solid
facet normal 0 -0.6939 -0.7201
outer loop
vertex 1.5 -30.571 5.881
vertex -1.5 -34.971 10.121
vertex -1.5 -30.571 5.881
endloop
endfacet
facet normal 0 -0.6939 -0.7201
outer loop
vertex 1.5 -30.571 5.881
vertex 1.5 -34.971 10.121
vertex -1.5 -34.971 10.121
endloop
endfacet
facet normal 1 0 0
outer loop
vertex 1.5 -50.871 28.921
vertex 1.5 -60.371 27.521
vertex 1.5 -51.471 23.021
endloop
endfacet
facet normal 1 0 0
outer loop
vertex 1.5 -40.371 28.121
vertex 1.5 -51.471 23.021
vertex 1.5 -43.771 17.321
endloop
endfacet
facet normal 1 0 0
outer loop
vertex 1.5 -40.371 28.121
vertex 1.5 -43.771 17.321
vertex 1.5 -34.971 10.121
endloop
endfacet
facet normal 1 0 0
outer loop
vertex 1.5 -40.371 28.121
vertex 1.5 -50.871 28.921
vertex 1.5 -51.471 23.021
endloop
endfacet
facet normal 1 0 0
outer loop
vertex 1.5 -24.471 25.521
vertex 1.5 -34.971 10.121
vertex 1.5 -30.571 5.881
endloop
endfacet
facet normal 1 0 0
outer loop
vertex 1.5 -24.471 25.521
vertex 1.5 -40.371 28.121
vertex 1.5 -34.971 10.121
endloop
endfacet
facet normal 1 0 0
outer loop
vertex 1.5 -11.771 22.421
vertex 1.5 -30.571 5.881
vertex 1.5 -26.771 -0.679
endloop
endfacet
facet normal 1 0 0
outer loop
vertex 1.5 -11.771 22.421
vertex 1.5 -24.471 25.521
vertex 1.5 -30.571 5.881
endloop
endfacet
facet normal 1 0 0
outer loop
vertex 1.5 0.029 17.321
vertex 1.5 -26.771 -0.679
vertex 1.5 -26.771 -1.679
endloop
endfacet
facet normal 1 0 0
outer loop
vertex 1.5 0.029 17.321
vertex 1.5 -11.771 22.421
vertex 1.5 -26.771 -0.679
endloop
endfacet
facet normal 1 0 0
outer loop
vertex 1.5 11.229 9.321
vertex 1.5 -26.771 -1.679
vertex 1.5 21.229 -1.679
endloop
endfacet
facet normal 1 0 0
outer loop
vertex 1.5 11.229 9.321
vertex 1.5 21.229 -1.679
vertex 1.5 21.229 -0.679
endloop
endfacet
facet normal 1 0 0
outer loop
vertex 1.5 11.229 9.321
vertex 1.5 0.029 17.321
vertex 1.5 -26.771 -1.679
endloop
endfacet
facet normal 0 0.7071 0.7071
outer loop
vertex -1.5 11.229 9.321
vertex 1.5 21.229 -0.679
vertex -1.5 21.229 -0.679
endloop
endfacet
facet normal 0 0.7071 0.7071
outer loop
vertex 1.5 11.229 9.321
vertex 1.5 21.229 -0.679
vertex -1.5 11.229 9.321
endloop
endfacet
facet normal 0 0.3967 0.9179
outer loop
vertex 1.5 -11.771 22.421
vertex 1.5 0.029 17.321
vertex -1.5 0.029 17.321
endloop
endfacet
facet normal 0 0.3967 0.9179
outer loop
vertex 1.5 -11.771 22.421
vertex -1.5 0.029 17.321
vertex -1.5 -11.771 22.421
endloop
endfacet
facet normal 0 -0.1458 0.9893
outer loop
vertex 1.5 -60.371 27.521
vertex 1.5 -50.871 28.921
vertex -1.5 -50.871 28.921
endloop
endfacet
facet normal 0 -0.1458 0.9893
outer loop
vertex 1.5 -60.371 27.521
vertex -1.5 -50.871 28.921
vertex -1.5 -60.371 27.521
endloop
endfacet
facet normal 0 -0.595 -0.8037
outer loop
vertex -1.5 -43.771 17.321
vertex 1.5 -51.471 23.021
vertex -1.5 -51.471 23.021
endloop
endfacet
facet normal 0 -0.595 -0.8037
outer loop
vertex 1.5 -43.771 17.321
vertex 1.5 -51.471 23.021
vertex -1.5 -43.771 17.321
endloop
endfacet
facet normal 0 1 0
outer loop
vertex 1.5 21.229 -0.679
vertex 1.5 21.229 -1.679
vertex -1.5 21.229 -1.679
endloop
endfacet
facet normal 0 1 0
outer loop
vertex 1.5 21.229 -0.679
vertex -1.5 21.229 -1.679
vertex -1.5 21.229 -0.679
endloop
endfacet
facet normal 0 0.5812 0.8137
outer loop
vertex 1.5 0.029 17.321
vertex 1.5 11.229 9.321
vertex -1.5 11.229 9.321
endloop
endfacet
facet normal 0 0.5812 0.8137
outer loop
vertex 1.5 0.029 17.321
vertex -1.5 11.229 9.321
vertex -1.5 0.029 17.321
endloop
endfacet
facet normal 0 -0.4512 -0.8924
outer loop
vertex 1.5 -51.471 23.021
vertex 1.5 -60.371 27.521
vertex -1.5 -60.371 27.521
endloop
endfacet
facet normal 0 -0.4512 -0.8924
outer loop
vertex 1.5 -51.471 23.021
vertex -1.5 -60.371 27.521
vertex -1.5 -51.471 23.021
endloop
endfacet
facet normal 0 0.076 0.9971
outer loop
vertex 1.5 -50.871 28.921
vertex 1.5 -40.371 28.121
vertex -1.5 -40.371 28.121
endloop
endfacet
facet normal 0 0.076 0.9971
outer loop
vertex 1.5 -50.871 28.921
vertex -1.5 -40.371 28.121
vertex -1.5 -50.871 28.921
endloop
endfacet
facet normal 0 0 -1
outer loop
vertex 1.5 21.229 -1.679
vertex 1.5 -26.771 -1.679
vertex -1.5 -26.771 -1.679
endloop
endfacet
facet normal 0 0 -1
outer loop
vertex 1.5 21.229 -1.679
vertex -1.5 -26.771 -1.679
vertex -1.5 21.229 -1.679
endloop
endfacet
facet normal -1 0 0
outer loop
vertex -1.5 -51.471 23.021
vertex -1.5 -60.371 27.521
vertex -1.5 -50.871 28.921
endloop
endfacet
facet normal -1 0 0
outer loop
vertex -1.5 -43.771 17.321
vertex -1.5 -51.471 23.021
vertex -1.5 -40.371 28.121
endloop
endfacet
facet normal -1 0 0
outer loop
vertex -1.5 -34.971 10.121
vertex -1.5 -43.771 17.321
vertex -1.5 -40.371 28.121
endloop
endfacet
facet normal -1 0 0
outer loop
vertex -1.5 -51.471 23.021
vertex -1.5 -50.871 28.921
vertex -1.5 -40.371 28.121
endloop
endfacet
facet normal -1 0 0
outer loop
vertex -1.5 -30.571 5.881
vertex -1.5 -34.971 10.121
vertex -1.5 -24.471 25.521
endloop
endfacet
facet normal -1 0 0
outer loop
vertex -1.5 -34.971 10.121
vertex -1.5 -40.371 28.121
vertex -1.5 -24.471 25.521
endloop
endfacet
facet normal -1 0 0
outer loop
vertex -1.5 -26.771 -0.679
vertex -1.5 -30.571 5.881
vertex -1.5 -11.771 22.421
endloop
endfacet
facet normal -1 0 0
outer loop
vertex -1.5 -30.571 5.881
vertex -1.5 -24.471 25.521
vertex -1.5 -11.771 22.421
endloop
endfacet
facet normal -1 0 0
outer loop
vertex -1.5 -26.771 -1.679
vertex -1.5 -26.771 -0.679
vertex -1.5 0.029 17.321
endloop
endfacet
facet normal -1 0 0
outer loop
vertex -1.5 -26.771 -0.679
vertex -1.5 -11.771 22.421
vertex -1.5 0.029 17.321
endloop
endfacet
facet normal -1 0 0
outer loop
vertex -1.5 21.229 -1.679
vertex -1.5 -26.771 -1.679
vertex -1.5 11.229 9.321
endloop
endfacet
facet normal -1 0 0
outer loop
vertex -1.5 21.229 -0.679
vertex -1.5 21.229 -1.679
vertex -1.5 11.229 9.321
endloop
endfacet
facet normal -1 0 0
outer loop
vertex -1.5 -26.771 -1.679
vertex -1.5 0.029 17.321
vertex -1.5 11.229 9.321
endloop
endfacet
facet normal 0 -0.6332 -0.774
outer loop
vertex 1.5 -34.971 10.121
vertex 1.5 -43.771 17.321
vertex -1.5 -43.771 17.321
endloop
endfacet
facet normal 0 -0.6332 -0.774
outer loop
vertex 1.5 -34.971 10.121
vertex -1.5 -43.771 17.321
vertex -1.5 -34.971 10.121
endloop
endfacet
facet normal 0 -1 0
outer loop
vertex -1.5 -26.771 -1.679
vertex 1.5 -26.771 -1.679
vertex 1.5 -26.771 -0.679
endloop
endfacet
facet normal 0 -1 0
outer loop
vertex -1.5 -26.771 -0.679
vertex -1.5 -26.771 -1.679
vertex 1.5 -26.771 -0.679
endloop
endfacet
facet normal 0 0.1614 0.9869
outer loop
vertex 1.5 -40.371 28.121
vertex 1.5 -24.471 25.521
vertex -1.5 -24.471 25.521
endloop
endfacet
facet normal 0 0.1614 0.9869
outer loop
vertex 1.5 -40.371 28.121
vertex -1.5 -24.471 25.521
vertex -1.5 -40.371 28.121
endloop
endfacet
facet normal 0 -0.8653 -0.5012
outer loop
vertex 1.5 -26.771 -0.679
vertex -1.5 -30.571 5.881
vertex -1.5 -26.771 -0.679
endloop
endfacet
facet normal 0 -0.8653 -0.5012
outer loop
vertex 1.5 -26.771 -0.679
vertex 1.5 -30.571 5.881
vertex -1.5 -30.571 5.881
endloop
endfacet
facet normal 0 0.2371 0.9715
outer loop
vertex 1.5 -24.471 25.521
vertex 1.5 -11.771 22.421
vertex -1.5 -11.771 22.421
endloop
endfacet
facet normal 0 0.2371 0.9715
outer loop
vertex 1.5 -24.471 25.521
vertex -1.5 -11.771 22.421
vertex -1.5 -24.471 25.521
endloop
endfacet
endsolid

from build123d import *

# Parameters (mm, degrees)
F0_W     = 48
F0_H     = 1
F1_DEPTH = 1.5


with BuildPart() as f1:
    # F0 (on Right) → F1 (new body, symmetric)
    with BuildSketch(Plane.YZ):
        with Locations((-2.771254, -1.178571)):
            Rectangle(F0_W, F0_H)
        Polygon((-26.771254, -0.678571), (21.228746, -0.678571), (11.228746, 9.321429), (0.028746, 17.321429), (-11.771254, 22.421429), (-24.471254, 25.521429), (-40.371254, 28.121429), (-50.871254, 28.921429), (-60.371254, 27.521429), (-51.471254, 23.021429), (-43.771254, 17.321429), (-34.971254, 10.121429), (-30.571254, 5.881429), align=None)
    extrude(amount=F1_DEPTH, both=True)


solid = f1.part
